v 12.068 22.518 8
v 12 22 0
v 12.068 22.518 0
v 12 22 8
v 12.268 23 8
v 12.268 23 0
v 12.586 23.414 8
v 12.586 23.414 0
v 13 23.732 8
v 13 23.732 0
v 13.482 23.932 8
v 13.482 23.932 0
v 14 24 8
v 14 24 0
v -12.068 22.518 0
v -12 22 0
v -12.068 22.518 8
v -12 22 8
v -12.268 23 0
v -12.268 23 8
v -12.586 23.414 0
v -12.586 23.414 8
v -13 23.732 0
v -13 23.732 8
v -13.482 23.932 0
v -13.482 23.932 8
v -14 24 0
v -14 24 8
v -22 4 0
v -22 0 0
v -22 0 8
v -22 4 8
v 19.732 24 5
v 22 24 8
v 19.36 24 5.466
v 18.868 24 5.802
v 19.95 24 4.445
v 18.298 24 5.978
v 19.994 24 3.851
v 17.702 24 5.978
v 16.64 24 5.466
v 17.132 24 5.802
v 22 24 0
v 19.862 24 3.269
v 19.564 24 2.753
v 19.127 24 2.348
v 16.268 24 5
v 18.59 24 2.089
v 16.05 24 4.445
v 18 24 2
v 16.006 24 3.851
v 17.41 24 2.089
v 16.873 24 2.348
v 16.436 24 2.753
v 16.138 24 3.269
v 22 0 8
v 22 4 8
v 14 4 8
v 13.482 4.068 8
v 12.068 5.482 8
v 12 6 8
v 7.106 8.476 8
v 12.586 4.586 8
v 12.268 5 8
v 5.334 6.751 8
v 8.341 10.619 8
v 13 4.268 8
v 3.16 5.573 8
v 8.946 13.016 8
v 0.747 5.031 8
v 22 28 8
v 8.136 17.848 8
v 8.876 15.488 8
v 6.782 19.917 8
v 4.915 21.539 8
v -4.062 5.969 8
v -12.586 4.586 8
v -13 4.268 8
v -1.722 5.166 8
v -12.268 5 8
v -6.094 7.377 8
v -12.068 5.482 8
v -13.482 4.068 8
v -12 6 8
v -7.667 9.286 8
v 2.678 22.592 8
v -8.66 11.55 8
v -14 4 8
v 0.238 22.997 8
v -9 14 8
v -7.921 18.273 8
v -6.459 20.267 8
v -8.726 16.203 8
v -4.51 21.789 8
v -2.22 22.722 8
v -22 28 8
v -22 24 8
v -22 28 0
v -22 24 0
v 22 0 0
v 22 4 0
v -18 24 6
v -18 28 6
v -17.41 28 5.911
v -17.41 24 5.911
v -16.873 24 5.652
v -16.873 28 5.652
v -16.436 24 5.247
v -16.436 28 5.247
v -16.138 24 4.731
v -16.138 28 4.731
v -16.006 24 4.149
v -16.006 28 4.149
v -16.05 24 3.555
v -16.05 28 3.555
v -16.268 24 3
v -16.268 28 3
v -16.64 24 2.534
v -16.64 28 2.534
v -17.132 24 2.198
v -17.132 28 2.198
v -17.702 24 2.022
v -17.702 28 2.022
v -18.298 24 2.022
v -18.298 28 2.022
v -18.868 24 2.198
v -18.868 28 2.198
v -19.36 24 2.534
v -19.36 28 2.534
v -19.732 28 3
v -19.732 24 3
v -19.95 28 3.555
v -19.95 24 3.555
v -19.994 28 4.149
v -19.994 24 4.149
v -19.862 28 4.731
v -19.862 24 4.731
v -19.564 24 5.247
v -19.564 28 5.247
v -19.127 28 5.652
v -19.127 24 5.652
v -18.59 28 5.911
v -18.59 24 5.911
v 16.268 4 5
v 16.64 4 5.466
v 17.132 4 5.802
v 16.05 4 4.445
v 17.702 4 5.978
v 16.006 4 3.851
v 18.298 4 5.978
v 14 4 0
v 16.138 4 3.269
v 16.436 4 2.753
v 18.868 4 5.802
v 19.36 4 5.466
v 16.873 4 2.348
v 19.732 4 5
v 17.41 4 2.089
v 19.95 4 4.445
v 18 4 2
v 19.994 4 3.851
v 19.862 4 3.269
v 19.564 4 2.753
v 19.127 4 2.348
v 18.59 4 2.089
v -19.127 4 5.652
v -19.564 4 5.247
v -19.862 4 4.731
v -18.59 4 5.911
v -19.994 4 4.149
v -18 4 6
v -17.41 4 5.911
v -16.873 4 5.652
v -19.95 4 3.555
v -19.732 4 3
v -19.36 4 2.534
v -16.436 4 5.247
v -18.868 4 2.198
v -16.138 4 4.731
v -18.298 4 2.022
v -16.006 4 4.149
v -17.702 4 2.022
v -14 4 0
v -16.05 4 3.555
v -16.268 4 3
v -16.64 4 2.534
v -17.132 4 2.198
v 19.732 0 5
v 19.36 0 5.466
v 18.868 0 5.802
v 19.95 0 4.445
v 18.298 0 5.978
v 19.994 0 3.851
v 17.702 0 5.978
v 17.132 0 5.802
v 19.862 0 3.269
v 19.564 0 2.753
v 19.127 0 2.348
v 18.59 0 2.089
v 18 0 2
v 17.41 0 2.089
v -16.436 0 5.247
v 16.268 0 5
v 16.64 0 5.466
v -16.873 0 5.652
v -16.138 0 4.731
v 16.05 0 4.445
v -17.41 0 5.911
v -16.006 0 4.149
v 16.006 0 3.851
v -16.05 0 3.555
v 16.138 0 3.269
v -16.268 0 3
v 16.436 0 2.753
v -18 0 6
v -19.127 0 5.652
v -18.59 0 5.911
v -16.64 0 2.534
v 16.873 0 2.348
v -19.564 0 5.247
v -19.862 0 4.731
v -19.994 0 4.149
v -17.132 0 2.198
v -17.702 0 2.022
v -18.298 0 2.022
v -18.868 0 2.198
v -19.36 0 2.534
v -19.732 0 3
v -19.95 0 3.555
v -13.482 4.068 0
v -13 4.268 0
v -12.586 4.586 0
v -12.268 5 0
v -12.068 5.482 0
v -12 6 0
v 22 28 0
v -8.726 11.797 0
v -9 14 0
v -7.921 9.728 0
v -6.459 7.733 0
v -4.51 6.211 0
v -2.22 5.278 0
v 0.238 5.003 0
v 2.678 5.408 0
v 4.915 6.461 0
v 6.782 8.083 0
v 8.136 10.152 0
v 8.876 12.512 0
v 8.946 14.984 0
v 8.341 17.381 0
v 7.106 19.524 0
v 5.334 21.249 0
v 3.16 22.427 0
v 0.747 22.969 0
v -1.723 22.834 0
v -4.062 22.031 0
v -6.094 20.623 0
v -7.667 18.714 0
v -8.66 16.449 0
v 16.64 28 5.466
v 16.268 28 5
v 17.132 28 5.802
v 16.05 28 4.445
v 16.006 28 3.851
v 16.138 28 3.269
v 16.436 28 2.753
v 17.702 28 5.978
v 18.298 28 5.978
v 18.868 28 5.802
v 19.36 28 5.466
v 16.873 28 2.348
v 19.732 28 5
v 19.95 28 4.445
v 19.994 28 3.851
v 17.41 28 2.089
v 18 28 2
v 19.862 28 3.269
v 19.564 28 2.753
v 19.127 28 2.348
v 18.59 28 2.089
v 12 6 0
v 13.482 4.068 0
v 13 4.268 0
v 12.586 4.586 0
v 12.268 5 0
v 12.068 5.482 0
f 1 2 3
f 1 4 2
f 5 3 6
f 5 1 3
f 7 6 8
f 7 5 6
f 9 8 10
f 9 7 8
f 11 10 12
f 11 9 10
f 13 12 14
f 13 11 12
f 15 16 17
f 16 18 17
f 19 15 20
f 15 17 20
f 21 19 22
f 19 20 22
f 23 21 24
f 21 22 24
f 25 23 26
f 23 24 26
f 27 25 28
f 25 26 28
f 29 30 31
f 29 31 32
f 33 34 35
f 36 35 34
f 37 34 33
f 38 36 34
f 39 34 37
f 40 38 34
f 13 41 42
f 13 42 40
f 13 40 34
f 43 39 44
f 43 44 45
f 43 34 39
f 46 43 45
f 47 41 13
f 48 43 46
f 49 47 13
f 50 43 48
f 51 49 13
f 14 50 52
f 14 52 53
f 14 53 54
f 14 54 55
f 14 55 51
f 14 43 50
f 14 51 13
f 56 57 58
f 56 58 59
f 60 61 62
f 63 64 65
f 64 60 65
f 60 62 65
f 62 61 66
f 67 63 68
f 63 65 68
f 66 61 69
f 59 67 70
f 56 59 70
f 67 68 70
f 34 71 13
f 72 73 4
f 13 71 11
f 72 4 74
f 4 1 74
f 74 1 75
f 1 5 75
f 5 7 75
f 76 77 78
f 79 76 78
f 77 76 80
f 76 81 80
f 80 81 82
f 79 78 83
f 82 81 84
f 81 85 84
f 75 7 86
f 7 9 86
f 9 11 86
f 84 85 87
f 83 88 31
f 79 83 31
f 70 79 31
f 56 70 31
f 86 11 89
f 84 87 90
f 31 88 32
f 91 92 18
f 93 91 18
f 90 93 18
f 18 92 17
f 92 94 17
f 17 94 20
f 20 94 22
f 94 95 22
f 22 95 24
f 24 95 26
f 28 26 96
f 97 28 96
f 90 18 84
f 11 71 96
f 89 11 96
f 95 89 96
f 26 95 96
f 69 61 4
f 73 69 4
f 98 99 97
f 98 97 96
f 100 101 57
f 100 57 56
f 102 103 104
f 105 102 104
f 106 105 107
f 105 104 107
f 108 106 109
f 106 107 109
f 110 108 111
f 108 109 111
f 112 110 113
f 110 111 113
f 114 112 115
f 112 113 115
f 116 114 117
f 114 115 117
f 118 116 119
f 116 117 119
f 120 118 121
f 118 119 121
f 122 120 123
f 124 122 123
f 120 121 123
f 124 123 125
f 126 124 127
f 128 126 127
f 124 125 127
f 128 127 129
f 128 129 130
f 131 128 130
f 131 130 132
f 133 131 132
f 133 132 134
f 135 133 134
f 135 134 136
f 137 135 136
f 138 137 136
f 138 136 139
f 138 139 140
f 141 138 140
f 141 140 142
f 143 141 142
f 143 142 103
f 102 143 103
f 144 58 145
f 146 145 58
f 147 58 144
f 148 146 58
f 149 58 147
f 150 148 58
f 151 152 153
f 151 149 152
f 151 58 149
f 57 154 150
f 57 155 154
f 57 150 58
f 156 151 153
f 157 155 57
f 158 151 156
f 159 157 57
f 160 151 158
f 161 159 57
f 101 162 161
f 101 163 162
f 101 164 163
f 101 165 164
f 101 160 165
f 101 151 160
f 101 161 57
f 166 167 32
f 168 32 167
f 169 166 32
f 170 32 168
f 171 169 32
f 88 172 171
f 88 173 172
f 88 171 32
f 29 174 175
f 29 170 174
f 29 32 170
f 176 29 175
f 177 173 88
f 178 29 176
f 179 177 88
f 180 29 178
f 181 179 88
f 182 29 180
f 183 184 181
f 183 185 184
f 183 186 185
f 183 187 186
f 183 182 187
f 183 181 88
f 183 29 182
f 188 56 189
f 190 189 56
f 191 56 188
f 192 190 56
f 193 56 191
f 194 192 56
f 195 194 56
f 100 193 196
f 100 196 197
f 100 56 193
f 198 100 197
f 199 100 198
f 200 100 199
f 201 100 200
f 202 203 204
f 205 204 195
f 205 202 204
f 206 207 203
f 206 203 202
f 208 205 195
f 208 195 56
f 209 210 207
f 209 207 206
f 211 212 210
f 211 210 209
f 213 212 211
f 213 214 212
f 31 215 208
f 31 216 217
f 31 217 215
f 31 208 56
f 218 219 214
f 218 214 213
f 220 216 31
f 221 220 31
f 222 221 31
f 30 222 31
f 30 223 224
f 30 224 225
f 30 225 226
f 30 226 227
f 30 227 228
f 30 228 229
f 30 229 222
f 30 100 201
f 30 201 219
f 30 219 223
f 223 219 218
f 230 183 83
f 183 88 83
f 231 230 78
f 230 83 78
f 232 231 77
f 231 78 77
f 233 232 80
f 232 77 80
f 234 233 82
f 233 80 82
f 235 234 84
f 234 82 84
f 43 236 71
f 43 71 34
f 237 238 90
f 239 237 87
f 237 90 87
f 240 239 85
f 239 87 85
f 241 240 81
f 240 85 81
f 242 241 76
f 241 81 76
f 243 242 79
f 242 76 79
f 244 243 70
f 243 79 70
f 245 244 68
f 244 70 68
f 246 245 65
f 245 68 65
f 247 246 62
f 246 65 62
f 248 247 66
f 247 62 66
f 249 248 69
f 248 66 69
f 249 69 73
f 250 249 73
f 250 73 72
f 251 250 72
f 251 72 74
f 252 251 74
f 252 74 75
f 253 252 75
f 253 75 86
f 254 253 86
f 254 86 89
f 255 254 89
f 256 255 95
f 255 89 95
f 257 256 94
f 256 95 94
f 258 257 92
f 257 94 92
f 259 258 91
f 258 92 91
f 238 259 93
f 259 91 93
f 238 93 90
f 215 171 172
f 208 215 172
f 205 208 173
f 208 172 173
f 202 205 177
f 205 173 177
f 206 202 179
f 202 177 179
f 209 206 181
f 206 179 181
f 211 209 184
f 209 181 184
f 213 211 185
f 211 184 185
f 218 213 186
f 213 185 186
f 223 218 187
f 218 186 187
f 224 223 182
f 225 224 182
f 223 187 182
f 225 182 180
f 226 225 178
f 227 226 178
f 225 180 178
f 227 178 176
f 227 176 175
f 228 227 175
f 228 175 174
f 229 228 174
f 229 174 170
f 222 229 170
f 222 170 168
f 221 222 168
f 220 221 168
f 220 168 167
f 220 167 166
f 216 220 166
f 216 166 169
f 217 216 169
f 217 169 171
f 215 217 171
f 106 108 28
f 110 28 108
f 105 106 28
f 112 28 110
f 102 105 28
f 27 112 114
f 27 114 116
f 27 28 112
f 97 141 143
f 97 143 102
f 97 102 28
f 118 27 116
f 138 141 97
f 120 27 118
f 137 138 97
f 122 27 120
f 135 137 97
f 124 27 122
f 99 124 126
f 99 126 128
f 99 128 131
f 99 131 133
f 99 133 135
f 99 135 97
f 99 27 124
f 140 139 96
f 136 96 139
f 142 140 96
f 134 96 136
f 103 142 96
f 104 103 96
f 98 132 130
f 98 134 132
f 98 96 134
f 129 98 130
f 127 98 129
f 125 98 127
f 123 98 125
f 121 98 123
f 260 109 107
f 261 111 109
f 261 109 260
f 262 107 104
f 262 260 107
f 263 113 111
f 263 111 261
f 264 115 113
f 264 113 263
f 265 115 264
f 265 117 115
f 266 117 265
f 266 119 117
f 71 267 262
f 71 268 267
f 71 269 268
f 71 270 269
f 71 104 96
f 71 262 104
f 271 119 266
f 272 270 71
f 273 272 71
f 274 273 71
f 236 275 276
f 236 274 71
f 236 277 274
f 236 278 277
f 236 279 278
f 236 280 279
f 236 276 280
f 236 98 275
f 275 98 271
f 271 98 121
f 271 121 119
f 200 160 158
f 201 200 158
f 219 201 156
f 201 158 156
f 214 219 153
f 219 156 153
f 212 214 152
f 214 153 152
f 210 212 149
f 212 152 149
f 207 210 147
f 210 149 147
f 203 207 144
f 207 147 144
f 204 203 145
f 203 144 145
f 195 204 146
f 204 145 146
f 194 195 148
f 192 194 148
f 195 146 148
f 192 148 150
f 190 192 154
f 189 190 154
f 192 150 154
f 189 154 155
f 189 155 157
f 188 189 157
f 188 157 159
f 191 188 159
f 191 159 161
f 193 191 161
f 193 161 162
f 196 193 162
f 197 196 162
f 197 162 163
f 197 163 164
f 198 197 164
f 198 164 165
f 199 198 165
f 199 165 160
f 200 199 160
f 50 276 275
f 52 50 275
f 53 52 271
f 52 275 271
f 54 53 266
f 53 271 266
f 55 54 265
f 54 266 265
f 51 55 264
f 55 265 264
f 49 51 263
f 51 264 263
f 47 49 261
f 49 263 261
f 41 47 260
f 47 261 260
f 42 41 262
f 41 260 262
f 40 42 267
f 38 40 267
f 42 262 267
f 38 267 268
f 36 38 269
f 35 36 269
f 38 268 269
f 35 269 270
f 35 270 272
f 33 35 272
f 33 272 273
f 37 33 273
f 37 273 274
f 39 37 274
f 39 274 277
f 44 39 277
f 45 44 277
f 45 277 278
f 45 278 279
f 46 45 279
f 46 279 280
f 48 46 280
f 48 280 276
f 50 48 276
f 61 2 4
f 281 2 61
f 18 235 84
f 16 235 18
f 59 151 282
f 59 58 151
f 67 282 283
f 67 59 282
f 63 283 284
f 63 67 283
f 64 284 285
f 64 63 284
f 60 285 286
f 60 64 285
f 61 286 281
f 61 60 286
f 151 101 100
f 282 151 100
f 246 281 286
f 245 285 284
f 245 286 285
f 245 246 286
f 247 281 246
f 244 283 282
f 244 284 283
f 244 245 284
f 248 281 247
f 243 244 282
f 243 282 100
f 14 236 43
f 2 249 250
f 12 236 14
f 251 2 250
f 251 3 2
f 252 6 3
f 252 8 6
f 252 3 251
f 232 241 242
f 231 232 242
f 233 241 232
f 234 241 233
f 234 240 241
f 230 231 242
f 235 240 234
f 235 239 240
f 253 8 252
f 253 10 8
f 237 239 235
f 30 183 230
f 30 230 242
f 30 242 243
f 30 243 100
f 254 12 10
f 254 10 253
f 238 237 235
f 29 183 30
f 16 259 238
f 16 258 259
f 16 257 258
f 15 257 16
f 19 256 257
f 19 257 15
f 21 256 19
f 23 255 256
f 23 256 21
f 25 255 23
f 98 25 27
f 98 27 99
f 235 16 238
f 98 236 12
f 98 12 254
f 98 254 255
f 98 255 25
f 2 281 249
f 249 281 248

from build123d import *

# Parameters (mm, degrees)
EXTRUDE_1_DEPTH     = 8
SKETCH_2_RX         = 9
SKETCH_2_RY         = 9
CUT_EXTRUDE_1_DEPTH = 37.496575182
FILLET_1_R          = 2
SKETCH_3_R          = 2
CUT_EXTRUDE_2_DEPTH = 37.496575341


with BuildPart() as part:
    # 草图1 → 凸台-拉伸1 (new body)
    with BuildSketch(Plane.XY):
        Polygon((22, 0), (-22, 0), (-22, 4), (-12, 4), (-12, 24), (-22, 24), (-22, 28), (22, 28), (22, 24), (12, 24), (12, 4), (22, 4), align=None)
    extrude(amount=EXTRUDE_1_DEPTH)

    # 草图2 → 切除-拉伸1 (cut, through all)
    with BuildSketch(Plane.XY.offset(8)):
        with Locations(Location((0, 14), (0, 0, 180))):
            Ellipse(SKETCH_2_RX, SKETCH_2_RY)
    extrude(amount=-CUT_EXTRUDE_1_DEPTH, mode=Mode.SUBTRACT)

    # 圆角1
    fillet_1_edges = [part.edges().sort_by_distance(p)[0] for p in [
        (-12, 4, 4),
        (-12, 24, 4),
        (12, 24, 4),
        (12, 4, 4),
    ]]
    fillet(fillet_1_edges, radius=FILLET_1_R)

    # 草图3 → 切除-拉伸2 (cut, through all)
    with BuildSketch(Plane(origin=(0, 28, 0), x_dir=(1, 0, 0), z_dir=(0, 1, 0))):
        with Locations(Location((-18, -4, 0), (0, 0, 270))):
            Circle(SKETCH_3_R)
        with Locations(Location((18, -4, 0), (0, 0, 90))):
            Circle(SKETCH_3_R)
    extrude(amount=-CUT_EXTRUDE_2_DEPTH, mode=Mode.SUBTRACT)


solid = part.part
